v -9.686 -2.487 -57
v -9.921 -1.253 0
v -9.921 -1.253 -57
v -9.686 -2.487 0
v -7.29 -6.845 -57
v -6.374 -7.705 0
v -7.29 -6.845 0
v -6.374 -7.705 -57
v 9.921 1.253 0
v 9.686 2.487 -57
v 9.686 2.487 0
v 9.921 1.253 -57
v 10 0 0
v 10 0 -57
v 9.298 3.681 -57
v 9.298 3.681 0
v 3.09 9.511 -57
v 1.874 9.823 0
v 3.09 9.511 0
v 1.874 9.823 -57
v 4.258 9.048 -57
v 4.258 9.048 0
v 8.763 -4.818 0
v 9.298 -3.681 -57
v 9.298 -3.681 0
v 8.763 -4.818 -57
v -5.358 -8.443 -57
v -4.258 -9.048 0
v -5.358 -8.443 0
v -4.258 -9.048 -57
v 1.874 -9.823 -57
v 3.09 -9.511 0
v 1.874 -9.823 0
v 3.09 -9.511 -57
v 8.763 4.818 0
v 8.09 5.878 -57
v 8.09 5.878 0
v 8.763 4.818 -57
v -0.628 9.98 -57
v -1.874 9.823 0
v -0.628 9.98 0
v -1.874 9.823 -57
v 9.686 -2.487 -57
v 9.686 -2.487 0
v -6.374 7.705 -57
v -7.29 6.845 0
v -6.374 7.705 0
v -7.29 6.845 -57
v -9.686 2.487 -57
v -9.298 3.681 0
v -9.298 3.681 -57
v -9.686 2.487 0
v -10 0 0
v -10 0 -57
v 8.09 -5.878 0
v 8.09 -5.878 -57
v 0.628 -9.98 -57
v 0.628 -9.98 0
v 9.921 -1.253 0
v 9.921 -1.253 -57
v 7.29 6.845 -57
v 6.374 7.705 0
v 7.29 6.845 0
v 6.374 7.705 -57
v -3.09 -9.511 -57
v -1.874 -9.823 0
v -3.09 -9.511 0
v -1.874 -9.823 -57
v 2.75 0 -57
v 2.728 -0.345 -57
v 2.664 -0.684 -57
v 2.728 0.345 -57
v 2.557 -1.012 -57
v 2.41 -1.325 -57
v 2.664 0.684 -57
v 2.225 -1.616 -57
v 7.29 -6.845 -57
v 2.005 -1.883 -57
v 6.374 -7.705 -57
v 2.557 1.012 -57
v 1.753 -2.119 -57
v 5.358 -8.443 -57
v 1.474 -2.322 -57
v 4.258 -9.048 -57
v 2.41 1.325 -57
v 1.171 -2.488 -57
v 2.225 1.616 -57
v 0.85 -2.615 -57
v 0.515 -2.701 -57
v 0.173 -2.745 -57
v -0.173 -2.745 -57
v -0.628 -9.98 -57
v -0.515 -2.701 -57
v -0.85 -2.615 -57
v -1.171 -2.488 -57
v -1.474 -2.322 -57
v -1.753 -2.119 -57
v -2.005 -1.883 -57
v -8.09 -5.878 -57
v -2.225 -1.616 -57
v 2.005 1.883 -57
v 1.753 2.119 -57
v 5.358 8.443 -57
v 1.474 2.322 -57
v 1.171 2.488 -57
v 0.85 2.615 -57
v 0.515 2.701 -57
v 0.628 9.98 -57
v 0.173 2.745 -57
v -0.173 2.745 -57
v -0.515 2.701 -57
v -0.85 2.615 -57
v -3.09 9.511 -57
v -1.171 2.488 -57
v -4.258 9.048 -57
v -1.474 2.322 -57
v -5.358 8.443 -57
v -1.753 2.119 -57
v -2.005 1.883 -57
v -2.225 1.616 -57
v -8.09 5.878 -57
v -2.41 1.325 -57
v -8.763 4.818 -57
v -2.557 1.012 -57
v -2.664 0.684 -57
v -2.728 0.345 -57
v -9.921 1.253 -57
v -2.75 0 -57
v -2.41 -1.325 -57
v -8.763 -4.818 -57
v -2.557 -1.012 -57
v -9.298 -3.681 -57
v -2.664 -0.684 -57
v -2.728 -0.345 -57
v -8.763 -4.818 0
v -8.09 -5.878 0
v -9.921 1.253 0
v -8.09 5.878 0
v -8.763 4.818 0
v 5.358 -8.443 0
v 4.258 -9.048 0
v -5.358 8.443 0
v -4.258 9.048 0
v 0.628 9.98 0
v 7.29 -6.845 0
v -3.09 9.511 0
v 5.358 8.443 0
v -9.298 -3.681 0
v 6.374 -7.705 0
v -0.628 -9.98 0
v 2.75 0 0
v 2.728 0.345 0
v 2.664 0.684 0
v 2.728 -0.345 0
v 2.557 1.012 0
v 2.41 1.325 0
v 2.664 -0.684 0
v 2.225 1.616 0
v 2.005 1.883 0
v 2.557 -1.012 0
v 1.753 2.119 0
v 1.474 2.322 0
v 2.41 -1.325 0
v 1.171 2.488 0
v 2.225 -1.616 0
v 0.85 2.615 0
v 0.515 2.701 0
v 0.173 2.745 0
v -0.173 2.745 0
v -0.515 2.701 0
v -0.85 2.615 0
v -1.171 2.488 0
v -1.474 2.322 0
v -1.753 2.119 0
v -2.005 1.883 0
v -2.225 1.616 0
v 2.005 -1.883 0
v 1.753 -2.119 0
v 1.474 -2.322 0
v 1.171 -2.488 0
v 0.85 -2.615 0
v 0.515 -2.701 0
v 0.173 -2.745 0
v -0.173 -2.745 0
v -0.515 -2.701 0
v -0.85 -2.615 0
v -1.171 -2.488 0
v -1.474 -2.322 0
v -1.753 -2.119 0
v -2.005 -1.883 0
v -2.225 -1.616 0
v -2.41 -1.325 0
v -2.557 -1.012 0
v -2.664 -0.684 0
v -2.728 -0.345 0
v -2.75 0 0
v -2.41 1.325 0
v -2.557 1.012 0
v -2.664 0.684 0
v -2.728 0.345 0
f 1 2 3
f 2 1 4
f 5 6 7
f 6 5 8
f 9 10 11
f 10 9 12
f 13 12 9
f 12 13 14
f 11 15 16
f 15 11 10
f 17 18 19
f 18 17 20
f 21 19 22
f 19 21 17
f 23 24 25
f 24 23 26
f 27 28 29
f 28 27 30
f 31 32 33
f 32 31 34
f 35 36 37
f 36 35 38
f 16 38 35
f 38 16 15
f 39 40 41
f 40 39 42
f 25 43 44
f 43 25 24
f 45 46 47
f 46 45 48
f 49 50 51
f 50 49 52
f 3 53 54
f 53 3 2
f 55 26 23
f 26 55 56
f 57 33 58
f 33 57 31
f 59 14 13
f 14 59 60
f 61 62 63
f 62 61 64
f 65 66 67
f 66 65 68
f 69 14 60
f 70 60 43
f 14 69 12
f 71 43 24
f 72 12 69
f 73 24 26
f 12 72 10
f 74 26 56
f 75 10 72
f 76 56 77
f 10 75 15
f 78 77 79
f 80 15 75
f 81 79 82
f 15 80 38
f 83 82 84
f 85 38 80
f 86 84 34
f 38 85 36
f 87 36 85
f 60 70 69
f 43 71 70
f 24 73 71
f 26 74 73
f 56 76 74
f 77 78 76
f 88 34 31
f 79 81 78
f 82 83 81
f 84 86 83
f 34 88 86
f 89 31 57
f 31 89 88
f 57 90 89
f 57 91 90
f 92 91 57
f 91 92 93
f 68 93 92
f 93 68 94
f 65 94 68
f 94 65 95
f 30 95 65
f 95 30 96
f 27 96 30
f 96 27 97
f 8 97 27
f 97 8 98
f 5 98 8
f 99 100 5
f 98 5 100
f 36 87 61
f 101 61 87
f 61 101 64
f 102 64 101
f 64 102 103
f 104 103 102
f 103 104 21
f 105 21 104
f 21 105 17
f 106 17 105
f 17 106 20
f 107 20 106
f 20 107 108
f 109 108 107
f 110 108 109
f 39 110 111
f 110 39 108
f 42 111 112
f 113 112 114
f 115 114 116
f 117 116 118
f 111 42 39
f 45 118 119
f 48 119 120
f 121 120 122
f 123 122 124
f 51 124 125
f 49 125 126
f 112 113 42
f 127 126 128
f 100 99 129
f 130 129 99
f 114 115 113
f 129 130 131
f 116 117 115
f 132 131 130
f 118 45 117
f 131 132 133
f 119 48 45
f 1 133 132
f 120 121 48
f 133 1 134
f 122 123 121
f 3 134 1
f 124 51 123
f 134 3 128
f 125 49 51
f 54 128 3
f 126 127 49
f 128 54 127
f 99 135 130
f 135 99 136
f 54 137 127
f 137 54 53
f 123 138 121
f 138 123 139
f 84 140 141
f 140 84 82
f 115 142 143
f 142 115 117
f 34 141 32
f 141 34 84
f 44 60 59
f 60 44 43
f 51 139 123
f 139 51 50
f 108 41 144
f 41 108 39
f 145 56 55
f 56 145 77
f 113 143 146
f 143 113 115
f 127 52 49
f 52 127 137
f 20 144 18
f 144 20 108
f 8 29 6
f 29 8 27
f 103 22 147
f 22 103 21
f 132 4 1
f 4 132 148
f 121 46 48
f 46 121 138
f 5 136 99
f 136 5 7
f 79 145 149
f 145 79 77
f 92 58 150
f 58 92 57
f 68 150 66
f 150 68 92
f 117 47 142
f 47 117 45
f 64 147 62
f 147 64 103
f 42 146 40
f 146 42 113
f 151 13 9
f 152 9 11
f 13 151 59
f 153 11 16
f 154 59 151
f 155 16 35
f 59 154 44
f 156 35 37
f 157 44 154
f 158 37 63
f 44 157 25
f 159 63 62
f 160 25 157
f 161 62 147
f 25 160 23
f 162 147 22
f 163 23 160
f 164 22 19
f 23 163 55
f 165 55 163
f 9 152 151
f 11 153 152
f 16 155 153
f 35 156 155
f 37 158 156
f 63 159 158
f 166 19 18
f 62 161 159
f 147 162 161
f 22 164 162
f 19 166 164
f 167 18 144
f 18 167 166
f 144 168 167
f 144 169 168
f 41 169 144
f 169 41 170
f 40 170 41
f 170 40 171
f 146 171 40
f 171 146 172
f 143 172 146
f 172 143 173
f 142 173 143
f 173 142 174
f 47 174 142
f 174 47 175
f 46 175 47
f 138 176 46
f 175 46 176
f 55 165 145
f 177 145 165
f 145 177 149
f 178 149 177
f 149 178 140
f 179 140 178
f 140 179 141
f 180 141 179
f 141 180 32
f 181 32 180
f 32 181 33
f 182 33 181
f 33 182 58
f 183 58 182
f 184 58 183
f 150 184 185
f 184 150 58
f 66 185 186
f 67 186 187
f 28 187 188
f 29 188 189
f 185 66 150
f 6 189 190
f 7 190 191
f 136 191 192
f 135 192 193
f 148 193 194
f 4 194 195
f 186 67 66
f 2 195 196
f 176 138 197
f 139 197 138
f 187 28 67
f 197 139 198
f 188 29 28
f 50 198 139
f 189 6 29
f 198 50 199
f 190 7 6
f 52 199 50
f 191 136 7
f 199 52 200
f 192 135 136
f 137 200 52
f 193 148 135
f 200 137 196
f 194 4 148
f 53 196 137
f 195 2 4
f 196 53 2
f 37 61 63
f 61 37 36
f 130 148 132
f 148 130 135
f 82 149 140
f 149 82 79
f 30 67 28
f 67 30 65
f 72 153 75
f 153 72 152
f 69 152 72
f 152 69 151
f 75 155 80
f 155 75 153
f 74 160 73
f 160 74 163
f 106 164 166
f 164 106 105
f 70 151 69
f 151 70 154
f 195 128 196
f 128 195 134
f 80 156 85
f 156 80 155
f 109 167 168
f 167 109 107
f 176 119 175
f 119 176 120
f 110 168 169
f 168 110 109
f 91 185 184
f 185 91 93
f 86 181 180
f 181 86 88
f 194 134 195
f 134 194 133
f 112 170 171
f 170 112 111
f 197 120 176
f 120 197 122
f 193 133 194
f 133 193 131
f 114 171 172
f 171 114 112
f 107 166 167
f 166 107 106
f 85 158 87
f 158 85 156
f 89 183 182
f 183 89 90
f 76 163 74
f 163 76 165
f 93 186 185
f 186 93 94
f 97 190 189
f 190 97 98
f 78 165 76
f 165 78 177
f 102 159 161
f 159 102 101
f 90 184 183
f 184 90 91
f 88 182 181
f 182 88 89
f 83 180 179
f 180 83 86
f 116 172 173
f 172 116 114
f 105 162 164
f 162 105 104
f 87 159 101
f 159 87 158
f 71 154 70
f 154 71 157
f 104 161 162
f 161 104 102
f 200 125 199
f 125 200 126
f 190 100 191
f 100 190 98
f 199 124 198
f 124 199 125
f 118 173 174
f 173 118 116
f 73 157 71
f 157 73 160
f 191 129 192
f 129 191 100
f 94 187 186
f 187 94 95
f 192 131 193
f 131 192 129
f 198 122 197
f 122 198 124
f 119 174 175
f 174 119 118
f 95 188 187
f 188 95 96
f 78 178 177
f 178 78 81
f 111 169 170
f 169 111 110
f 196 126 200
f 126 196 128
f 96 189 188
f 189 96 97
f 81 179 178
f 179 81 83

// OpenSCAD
$fn = 50;


difference() {
	union() {
		translate(v = [0, 0, -57.0000000000]) {
			cylinder(h = 57, r = 10.0000000000);
		}
		cylinder(h = 0, r = 16.0000000000);
	}
	union() {
		#translate(v = [0, 0, -57]) {
			cylinder(h = 57, r = 2.7500000000);
		}
	}
}
